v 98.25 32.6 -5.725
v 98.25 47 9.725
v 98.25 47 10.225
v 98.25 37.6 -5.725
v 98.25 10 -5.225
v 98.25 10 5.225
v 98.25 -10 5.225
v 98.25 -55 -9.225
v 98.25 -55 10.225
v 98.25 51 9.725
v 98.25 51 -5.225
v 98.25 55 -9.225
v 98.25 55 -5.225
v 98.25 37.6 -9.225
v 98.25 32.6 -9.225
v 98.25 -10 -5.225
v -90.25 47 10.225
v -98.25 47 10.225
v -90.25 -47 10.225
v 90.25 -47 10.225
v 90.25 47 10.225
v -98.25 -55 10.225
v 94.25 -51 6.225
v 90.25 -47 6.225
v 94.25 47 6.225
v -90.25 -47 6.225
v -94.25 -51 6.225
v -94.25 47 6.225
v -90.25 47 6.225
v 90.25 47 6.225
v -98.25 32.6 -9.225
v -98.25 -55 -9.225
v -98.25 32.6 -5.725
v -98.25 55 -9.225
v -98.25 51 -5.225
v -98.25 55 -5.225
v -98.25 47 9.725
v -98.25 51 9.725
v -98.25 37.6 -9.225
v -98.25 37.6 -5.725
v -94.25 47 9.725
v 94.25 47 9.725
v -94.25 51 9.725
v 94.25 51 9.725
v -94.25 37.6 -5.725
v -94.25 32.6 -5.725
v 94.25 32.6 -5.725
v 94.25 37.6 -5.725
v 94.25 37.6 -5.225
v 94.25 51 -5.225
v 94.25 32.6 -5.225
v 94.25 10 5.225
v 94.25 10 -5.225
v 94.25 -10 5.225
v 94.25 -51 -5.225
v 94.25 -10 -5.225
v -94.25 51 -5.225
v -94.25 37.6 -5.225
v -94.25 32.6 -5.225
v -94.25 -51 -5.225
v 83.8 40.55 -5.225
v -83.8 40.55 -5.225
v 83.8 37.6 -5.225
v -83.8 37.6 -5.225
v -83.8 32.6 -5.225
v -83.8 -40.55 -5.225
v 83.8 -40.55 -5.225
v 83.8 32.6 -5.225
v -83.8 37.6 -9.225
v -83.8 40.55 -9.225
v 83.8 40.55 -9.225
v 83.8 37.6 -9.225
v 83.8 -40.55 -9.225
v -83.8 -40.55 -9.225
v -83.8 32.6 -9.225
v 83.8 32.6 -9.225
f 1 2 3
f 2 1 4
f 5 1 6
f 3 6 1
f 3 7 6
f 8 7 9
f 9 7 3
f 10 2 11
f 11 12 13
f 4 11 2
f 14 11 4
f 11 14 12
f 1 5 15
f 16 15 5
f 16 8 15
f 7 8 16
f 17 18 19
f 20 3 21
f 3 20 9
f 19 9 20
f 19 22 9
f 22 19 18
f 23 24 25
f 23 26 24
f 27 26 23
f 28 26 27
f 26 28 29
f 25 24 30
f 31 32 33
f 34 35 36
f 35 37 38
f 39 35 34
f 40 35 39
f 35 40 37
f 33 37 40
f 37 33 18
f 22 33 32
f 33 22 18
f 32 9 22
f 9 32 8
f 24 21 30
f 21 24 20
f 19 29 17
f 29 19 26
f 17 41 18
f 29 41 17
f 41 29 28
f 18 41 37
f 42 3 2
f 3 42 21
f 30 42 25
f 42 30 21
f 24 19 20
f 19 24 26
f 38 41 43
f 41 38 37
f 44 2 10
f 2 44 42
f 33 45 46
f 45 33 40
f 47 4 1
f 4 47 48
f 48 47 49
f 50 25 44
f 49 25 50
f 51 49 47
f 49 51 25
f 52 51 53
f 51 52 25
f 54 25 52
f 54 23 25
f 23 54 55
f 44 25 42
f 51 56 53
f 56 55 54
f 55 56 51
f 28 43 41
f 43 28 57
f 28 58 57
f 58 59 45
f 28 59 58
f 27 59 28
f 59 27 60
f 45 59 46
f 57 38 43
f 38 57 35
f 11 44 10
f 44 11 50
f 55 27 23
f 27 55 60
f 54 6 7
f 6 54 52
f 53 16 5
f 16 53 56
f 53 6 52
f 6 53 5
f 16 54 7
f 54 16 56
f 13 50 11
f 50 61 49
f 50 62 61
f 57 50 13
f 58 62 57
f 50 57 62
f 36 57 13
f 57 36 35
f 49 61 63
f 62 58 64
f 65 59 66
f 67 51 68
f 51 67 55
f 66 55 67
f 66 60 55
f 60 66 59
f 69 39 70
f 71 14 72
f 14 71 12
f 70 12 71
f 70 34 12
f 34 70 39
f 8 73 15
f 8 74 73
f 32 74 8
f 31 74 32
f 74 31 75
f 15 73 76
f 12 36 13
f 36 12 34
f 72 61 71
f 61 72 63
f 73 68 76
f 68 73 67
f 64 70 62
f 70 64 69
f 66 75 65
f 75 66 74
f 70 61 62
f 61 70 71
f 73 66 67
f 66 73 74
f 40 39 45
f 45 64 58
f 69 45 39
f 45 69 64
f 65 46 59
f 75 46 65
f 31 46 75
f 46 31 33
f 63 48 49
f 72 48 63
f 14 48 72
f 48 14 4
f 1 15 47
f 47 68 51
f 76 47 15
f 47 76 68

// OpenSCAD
tolerance = 1;
cable_radius = 2 + tolerance/2;
size = [198.5, 120, 10.45];
margin = 4;

module frame(frame_size, border) {
  difference() {
    cube(size=frame_size, center=true);

    cube(size=[
      frame_size[0] - border,
      frame_size[1] - border,
      frame_size[2] + margin],
      center=true);
  }
}

module backplate() {
  backplate_border = 2 * (margin + size[2]);

  difference() {
    frame([
      size[0] - 2,
      size[1] - 10,
      margin
    ], border=backplate_border);

    for(i=[-1,1]) {
      translate([
        i*(size[0] - 2 - backplate_border + 10)/2,
        size[1]/2 - backplate_border + margin,
        0])
      cube([30,5,5], center=true);
    }
  }
}

module sides() {
  side_height = size[2] + margin + tolerance;

  difference() {
    frame([
      size[0] - 2,
      size[1] - 10,
      side_height
    ], border=2 * margin);

    // top opening
    translate([0, (size[1] - 10 - margin) / 2, 0])
    cube([
      size[0],
      margin,
      side_height
    ], center=true);

    // plug hole
    translate([(size[0] - 2 - margin) / 2, 0, -margin/2])
    cube([
      2 * margin,
      20,
      size[2]
    ], center=true);
  }
}

module top() {
  difference() {
    frame([
      size[0] - 2,
      size[1] - 10,
      margin
    ], border=4*margin);

    translate([0, (size[1] - 10 - 2*margin)/2, 0])
    cube([size[0], 2*margin, 2*margin], center=true);
  }
}

module holder() {
  union() {
    translate([0,0,(size[2] + margin)/2 + tolerance])
    top();

    translate([0,0,margin/2])
    sides();

    translate([0,0,-(size[2] + 2 * margin)/2 + 2])
    backplate();
  }
}

holder();
